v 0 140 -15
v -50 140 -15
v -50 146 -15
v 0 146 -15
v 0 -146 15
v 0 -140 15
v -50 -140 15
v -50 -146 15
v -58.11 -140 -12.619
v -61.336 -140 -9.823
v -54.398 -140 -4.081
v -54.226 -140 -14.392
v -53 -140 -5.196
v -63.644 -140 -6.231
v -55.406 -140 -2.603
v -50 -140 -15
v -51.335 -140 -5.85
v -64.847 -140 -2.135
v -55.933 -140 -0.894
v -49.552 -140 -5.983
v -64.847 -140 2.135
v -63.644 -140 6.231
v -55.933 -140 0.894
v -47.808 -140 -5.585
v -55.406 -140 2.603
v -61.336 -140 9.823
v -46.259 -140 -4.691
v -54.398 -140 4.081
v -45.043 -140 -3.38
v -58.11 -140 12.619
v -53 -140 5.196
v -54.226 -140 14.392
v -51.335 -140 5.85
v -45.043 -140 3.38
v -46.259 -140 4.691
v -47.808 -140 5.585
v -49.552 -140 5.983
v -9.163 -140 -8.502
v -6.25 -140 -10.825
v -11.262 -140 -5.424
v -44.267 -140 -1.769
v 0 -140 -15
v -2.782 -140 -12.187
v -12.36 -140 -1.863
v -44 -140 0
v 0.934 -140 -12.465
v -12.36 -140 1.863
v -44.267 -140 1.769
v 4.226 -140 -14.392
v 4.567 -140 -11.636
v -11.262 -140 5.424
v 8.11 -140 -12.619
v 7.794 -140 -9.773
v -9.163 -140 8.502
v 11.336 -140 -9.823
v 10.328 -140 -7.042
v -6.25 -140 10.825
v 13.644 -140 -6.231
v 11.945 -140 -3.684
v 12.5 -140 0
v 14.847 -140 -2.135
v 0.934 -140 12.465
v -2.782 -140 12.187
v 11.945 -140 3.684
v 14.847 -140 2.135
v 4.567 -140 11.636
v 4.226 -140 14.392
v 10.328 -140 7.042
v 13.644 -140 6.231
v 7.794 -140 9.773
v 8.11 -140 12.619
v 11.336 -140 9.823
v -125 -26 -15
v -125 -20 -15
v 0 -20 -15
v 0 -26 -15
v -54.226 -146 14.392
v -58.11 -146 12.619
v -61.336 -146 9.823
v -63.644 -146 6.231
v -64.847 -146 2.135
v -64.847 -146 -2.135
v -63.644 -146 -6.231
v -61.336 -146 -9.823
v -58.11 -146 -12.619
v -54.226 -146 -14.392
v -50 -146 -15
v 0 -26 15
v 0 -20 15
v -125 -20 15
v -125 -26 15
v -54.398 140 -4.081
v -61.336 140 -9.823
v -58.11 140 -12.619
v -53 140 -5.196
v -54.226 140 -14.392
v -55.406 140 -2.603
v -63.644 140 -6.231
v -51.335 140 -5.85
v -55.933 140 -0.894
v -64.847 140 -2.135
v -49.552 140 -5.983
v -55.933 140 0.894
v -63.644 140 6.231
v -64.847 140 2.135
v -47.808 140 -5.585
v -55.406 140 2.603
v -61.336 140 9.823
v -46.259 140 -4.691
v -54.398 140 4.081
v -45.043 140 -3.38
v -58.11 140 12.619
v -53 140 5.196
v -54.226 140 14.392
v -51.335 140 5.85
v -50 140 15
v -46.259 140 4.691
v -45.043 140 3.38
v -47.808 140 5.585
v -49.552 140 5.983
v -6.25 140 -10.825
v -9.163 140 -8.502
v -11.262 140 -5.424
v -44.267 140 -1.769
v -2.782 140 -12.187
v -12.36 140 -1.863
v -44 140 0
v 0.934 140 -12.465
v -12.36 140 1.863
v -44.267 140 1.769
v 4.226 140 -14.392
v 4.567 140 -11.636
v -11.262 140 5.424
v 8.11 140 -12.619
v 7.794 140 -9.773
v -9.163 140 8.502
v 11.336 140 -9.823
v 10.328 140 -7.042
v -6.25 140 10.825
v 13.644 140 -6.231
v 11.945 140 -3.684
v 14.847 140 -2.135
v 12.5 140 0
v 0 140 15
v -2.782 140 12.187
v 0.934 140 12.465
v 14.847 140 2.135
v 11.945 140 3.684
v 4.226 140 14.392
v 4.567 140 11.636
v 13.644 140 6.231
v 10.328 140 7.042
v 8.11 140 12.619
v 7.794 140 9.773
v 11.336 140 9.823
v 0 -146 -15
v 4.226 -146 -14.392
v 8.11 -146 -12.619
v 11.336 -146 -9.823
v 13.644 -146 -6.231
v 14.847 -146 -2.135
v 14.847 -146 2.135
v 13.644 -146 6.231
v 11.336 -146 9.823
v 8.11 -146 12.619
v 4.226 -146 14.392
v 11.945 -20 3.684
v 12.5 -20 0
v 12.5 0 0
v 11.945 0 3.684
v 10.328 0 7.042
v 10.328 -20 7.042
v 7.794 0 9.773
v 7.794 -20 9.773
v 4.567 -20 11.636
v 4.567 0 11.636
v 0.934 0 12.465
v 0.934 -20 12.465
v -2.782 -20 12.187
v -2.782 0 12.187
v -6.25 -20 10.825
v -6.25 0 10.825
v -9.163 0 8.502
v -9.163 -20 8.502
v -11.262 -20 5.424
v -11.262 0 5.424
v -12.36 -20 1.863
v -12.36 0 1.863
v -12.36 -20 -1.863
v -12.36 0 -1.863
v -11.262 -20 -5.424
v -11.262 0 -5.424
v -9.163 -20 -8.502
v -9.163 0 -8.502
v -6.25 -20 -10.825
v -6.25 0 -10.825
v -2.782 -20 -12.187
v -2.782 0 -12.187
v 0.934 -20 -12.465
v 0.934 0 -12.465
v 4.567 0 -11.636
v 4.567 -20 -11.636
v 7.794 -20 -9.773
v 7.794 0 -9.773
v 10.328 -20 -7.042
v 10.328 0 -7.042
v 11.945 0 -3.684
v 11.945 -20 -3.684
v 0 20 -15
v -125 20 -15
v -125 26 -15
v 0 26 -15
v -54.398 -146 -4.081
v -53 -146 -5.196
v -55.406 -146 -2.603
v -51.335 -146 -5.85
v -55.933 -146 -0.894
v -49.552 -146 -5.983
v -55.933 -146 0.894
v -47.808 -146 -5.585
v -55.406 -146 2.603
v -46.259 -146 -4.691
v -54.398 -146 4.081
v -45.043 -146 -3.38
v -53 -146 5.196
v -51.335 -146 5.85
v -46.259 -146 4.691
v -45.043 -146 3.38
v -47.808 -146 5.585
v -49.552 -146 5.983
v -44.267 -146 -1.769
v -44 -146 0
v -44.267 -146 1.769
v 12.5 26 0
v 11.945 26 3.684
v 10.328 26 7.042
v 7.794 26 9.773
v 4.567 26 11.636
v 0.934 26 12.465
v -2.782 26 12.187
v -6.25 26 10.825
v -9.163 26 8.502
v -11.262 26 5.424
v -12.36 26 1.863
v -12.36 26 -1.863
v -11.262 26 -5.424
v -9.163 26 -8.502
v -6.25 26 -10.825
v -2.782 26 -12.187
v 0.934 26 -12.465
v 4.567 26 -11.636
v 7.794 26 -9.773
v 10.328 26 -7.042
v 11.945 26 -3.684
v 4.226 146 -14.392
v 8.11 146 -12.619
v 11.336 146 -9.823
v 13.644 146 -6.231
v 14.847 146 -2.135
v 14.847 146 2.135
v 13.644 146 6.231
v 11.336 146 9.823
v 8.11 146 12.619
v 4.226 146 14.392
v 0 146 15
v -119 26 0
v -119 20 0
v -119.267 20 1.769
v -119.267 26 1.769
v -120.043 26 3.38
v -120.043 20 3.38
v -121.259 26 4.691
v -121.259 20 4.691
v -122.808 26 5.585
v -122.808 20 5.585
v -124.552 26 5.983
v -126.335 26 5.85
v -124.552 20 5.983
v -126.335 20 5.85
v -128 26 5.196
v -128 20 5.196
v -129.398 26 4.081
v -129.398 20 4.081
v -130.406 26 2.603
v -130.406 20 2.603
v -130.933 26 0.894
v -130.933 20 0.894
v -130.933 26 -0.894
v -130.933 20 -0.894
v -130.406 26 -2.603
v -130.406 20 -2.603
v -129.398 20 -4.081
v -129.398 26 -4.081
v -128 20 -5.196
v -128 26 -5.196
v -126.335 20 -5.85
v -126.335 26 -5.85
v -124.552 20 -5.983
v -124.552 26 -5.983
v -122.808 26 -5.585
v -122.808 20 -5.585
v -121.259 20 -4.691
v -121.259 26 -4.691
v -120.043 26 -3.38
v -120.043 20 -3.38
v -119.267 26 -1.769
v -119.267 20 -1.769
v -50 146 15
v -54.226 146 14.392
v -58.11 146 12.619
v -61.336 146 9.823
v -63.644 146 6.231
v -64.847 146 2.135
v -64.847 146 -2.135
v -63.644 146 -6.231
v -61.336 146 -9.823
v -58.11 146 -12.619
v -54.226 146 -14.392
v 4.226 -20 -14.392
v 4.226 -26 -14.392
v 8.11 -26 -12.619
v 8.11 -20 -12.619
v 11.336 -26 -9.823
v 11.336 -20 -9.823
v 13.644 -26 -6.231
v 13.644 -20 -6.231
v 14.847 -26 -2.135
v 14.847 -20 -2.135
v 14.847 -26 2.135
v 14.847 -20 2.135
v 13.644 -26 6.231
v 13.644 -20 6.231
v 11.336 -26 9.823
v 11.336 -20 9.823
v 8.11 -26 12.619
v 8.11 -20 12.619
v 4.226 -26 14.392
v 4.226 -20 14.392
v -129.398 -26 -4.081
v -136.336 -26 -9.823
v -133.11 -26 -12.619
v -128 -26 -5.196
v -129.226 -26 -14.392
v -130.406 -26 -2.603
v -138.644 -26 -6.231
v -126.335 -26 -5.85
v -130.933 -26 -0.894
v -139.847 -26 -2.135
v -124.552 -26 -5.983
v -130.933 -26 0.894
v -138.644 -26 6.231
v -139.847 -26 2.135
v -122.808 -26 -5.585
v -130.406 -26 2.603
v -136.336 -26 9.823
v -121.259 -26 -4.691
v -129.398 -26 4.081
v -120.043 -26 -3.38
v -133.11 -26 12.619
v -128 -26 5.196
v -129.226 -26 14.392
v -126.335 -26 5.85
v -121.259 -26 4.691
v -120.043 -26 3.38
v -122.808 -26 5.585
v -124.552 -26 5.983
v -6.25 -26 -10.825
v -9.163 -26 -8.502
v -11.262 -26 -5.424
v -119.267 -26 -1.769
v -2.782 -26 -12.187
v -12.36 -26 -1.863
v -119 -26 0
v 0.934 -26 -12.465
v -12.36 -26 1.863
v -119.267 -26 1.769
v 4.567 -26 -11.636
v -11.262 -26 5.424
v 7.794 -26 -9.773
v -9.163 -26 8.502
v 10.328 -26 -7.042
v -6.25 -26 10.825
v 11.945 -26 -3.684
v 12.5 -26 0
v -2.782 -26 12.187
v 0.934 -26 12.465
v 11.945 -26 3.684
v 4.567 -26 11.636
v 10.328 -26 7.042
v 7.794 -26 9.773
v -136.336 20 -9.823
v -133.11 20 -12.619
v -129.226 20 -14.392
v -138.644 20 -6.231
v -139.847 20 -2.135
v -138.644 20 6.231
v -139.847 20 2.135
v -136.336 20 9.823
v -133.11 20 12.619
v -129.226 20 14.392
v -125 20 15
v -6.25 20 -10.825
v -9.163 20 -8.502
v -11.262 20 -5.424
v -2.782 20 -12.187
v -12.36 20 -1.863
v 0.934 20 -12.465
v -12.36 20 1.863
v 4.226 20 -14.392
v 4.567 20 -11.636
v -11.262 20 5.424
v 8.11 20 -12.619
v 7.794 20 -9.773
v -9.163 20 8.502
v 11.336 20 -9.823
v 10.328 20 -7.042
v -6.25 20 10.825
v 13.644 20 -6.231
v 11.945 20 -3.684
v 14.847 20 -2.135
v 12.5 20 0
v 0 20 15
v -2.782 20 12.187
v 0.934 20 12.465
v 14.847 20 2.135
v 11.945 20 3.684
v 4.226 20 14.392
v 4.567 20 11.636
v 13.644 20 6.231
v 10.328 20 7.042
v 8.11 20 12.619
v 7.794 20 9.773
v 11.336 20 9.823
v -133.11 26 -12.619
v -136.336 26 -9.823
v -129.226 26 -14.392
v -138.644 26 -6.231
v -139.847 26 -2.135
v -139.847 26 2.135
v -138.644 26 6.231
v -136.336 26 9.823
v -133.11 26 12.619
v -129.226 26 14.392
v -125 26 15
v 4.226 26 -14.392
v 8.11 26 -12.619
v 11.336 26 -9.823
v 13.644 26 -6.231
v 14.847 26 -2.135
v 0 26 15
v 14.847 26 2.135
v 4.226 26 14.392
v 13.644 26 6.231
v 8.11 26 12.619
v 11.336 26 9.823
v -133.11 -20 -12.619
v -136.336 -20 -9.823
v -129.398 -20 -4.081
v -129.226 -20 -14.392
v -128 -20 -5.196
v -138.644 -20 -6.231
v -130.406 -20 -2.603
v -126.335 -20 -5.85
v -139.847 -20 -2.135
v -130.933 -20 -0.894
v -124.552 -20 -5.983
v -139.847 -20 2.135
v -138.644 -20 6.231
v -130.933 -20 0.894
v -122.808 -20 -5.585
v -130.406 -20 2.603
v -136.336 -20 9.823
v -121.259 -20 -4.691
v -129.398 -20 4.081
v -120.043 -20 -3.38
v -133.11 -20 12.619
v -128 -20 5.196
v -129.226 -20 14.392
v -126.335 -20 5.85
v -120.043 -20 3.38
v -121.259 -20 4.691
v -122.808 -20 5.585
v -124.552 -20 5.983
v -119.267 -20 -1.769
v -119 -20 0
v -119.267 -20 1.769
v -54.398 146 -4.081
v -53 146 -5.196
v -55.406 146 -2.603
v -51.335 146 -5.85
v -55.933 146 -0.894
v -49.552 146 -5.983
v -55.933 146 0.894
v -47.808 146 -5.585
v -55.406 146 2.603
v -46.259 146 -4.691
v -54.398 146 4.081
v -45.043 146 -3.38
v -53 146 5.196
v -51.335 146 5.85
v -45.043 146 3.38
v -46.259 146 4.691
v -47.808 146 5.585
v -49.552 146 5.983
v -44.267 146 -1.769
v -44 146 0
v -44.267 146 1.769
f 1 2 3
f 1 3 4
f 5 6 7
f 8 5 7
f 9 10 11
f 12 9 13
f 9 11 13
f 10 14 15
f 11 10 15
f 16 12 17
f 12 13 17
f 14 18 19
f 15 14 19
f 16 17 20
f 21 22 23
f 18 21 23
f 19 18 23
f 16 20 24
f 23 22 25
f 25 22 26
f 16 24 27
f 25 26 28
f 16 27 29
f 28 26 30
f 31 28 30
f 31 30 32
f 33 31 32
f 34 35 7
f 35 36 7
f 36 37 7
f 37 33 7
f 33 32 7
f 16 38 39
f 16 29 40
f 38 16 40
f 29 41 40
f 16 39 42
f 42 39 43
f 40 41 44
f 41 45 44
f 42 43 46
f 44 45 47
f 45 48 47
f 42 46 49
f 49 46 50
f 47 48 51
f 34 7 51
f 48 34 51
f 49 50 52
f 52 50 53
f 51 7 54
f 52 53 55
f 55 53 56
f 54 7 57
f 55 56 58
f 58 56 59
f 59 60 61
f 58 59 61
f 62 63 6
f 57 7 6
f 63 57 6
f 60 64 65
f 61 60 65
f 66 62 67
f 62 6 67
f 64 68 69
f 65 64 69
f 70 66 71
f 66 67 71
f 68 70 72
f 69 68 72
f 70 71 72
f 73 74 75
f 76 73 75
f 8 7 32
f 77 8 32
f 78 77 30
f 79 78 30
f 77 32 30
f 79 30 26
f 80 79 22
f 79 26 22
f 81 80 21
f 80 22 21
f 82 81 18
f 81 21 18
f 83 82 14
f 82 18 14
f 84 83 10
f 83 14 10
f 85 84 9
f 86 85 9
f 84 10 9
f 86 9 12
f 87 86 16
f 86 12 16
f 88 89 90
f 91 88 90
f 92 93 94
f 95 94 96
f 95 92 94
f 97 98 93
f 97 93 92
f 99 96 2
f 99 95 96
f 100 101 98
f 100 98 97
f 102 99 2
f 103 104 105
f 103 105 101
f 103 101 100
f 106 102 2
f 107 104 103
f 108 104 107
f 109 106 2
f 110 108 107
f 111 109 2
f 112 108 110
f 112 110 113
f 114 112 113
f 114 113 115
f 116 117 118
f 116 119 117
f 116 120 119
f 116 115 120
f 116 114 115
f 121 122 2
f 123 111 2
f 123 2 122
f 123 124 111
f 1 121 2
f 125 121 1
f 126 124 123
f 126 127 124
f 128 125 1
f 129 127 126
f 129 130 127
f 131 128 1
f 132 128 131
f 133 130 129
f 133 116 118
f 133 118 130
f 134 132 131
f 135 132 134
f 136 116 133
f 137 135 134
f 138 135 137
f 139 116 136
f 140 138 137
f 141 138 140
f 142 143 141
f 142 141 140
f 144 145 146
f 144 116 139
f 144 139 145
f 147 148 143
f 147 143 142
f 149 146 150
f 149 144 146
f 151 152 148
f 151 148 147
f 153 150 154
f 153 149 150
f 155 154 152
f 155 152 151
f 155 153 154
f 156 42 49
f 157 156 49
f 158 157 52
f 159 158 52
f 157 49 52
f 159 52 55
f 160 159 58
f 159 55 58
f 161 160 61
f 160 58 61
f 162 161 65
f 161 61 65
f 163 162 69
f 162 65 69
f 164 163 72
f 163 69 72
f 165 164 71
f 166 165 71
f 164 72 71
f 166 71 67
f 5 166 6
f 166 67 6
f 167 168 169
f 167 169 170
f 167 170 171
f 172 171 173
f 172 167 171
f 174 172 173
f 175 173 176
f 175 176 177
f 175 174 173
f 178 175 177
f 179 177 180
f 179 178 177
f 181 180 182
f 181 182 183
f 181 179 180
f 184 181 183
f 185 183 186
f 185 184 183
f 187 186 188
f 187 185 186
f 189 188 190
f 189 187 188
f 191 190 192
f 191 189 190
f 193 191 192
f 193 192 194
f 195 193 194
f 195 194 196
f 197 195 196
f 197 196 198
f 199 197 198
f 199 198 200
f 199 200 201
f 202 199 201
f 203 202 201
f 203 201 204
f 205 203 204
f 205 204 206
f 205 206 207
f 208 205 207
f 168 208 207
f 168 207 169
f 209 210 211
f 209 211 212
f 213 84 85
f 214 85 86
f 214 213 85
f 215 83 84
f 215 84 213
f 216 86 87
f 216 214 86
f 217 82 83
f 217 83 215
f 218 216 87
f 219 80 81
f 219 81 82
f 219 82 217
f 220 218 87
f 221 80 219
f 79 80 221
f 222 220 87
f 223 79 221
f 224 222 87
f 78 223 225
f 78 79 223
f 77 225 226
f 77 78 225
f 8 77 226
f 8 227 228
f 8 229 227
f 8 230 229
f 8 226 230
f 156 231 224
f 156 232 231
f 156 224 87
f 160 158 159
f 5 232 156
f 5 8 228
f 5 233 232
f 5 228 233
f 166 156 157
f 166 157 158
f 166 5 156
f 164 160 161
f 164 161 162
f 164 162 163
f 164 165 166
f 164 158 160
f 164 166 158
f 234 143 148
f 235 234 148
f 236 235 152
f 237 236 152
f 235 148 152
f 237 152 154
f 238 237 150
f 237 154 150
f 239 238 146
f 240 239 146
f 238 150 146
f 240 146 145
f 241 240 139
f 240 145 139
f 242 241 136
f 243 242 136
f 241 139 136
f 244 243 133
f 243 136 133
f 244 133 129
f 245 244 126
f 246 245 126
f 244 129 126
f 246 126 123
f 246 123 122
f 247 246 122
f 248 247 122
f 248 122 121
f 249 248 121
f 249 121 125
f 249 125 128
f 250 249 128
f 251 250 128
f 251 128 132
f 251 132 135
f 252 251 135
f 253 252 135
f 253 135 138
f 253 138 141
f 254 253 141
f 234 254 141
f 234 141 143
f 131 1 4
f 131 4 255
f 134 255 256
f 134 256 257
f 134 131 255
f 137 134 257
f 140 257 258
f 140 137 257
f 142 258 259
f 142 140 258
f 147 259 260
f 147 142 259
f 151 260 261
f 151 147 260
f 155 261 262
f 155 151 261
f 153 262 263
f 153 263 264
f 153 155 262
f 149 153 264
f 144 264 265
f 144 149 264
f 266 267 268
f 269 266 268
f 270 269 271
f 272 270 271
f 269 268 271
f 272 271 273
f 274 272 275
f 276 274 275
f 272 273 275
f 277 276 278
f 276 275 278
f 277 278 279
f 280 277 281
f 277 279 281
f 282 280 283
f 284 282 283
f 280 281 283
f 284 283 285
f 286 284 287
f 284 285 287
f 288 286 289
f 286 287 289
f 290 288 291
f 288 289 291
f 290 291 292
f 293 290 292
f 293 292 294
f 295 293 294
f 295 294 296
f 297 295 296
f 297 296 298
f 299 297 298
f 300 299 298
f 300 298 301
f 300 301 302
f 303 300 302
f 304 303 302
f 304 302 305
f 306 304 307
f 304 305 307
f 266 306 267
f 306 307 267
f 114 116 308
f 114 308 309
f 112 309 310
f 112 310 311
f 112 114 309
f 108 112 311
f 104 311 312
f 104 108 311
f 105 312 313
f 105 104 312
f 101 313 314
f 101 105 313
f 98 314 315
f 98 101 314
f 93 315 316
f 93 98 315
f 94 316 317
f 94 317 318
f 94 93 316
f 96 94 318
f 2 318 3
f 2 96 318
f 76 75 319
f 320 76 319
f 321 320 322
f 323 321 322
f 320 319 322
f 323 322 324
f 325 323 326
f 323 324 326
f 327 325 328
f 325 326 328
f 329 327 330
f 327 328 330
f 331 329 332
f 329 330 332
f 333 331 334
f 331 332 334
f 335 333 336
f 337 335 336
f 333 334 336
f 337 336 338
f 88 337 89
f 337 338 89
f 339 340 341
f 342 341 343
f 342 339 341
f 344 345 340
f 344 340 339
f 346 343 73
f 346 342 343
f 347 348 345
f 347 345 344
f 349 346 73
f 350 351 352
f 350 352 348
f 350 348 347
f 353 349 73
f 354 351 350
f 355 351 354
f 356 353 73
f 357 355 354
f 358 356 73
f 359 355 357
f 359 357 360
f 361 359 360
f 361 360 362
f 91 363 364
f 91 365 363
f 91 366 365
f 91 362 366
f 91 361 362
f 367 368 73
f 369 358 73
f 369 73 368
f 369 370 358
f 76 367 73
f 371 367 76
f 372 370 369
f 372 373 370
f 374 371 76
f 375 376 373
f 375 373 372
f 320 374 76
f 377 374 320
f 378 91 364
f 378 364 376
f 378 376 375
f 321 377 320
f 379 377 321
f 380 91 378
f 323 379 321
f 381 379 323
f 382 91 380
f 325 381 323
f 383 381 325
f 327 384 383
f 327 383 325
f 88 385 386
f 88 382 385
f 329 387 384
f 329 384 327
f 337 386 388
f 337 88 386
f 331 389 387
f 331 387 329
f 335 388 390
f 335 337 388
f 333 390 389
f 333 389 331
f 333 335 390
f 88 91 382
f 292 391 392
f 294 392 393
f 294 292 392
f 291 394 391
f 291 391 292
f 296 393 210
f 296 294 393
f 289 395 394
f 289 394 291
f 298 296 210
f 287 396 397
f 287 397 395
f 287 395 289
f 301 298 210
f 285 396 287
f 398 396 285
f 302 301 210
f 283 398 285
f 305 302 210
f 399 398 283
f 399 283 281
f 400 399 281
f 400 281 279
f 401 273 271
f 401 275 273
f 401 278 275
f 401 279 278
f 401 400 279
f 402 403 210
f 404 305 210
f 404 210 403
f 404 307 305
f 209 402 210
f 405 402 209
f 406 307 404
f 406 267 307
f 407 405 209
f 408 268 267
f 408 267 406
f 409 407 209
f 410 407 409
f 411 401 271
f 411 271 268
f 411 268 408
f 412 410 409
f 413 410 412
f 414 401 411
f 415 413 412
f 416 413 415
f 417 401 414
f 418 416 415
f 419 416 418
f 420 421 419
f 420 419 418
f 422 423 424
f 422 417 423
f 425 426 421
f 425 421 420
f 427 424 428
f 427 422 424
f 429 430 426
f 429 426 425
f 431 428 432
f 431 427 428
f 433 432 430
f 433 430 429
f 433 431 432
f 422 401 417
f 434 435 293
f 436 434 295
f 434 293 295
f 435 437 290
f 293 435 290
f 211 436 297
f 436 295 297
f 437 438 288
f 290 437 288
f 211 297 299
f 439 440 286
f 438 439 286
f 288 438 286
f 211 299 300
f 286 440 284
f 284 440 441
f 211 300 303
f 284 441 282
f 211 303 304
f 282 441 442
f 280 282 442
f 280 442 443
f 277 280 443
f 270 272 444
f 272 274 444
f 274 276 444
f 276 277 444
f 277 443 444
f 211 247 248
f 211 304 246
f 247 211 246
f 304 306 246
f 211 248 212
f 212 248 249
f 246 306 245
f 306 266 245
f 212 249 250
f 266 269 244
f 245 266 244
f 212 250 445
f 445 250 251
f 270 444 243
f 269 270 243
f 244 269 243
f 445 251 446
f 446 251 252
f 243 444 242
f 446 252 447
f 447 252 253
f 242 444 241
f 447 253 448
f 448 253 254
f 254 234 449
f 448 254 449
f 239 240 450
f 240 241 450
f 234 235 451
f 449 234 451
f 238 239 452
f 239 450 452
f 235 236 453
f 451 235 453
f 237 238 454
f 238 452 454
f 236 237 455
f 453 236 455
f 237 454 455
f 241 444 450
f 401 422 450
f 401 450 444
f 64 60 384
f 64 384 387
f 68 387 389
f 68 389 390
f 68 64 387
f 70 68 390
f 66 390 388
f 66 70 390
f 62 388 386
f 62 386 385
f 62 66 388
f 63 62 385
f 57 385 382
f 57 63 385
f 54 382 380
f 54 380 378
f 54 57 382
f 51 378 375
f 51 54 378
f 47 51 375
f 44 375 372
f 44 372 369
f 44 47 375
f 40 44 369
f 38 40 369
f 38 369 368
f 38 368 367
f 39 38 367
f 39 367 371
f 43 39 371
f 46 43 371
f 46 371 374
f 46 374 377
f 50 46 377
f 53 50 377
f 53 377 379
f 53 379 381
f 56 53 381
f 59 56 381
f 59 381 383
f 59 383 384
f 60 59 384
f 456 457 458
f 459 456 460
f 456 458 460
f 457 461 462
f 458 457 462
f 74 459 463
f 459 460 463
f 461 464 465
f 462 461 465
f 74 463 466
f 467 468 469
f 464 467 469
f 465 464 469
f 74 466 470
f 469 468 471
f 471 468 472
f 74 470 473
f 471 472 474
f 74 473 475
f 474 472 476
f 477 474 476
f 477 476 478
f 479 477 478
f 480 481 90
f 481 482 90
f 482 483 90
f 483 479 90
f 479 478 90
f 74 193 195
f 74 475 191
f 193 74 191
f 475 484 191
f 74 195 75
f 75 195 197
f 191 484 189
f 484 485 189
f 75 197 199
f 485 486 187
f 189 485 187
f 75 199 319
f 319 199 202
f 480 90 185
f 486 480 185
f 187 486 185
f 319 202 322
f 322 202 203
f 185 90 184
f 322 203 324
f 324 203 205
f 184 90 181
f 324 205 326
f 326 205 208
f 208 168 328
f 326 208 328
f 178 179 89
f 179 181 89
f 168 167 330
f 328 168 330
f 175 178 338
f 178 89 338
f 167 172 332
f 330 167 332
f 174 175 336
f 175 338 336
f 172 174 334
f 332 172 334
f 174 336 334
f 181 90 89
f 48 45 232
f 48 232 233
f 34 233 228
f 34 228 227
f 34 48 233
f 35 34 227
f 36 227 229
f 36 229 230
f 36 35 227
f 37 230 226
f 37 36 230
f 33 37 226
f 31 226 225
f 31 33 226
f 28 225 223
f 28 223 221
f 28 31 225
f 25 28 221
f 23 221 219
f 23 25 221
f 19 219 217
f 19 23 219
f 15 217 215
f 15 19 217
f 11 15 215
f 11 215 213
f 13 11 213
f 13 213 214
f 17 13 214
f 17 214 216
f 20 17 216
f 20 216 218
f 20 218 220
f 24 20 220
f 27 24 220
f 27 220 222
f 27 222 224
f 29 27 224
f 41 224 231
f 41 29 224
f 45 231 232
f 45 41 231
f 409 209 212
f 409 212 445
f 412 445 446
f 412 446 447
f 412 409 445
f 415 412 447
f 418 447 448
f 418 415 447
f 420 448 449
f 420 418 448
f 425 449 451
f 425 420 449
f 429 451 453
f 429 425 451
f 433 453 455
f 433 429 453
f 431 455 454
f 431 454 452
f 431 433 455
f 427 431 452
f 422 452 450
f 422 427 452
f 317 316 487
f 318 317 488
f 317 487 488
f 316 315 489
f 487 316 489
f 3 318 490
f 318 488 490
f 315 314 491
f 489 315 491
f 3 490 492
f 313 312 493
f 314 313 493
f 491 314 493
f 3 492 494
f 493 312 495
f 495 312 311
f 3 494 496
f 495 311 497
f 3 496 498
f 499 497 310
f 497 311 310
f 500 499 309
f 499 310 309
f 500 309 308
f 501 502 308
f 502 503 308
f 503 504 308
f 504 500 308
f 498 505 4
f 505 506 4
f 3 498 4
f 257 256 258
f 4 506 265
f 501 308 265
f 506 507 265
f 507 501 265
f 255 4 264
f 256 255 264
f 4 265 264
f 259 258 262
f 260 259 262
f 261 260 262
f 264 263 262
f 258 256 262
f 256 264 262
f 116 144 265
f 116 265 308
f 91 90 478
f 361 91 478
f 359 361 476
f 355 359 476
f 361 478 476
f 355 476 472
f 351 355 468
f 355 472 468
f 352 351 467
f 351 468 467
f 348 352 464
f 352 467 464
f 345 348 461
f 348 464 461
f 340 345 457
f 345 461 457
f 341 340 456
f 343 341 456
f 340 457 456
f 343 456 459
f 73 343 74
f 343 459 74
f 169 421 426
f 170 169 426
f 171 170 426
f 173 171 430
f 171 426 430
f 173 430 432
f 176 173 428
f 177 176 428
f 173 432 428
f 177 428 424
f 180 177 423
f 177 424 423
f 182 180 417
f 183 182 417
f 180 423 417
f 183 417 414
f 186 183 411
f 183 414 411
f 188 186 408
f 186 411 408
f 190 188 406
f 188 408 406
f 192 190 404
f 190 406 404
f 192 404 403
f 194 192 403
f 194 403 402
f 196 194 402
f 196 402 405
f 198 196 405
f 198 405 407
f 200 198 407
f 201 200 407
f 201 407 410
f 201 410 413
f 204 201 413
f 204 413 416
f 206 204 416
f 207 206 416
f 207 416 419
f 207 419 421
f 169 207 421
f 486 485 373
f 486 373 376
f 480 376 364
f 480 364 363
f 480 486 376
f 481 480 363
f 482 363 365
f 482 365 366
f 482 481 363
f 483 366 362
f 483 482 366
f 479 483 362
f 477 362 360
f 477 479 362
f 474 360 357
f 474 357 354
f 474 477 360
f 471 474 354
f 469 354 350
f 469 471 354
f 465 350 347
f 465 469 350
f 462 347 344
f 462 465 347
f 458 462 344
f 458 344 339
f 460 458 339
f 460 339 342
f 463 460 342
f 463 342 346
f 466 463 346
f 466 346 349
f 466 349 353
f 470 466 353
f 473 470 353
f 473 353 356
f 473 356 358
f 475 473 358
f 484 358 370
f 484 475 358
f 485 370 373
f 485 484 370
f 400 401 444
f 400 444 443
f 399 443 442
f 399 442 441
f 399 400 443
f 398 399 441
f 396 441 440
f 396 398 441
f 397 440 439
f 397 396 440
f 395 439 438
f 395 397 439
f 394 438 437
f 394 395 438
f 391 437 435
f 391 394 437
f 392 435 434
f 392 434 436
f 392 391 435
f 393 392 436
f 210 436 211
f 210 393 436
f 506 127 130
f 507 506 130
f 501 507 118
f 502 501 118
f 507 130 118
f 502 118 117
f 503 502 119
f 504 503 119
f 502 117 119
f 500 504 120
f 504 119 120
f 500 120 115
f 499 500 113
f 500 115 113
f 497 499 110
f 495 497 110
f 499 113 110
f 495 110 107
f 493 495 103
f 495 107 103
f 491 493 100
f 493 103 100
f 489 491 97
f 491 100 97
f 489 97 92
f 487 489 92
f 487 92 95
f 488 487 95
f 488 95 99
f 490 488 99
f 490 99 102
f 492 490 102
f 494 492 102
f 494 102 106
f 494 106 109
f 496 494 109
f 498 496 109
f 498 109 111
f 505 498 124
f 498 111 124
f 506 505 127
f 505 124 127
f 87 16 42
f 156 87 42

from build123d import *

# Parameters (mm, degrees)
F1_R     = 6
F1_R_2   = 12.5
F2_DEPTH = 6
F3_DEPTH = 140
F5_R     = 6
F6_DEPTH = 6


with BuildPart() as f2:
    # F1 (on offset) → F2 (new body)
    with BuildSketch(Plane.XZ.offset(140)):
        with BuildLine():
            Line((-50, -15), (0, -15))
            ThreePointArc((0, -15), (15, 0), (0, 15))
            Line((0, 15), (-50, 15))
            ThreePointArc((-50, 15), (-65, 0), (-50, -15))
        make_face()
        with Locations((-50, 0)):
            Circle(F1_R, mode=Mode.SUBTRACT)
        Circle(F1_R_2, mode=Mode.SUBTRACT)
        Circle(F1_R_2)
        Circle(F1_R, mode=Mode.SUBTRACT)
        Circle(F1_R)
    extrude(amount=F2_DEPTH)

    # F1 (on offset) → F3 (join, through all)
    with BuildSketch(Plane.XZ.offset(140)):
        Circle(F1_R_2)
        Circle(F1_R, mode=Mode.SUBTRACT)
        Circle(F1_R)
    extrude(amount=-F3_DEPTH)

    # F5 (on offset) → F6 (join)
    with BuildSketch(Plane.XZ.offset(20)):
        with BuildLine():
            Line((-125, -15), (0, -15))
            ThreePointArc((0, -15), (15, 0), (0, 15))
            Line((0, 15), (-125, 15))
            ThreePointArc((-125, 15), (-140, 0), (-125, -15))
        make_face()
        with Locations((-125, 0)):
            Circle(F5_R, mode=Mode.SUBTRACT)
    extrude(amount=F6_DEPTH)

    # F7: F2 across face


with BuildPart() as f2_1:
    add(f2.part)
    add(f2.part.mirror(Plane(origin=(0, 0, 0), x_dir=(1, 0, 0), z_dir=(0, 1, 0))))


solid = f2_1.part
